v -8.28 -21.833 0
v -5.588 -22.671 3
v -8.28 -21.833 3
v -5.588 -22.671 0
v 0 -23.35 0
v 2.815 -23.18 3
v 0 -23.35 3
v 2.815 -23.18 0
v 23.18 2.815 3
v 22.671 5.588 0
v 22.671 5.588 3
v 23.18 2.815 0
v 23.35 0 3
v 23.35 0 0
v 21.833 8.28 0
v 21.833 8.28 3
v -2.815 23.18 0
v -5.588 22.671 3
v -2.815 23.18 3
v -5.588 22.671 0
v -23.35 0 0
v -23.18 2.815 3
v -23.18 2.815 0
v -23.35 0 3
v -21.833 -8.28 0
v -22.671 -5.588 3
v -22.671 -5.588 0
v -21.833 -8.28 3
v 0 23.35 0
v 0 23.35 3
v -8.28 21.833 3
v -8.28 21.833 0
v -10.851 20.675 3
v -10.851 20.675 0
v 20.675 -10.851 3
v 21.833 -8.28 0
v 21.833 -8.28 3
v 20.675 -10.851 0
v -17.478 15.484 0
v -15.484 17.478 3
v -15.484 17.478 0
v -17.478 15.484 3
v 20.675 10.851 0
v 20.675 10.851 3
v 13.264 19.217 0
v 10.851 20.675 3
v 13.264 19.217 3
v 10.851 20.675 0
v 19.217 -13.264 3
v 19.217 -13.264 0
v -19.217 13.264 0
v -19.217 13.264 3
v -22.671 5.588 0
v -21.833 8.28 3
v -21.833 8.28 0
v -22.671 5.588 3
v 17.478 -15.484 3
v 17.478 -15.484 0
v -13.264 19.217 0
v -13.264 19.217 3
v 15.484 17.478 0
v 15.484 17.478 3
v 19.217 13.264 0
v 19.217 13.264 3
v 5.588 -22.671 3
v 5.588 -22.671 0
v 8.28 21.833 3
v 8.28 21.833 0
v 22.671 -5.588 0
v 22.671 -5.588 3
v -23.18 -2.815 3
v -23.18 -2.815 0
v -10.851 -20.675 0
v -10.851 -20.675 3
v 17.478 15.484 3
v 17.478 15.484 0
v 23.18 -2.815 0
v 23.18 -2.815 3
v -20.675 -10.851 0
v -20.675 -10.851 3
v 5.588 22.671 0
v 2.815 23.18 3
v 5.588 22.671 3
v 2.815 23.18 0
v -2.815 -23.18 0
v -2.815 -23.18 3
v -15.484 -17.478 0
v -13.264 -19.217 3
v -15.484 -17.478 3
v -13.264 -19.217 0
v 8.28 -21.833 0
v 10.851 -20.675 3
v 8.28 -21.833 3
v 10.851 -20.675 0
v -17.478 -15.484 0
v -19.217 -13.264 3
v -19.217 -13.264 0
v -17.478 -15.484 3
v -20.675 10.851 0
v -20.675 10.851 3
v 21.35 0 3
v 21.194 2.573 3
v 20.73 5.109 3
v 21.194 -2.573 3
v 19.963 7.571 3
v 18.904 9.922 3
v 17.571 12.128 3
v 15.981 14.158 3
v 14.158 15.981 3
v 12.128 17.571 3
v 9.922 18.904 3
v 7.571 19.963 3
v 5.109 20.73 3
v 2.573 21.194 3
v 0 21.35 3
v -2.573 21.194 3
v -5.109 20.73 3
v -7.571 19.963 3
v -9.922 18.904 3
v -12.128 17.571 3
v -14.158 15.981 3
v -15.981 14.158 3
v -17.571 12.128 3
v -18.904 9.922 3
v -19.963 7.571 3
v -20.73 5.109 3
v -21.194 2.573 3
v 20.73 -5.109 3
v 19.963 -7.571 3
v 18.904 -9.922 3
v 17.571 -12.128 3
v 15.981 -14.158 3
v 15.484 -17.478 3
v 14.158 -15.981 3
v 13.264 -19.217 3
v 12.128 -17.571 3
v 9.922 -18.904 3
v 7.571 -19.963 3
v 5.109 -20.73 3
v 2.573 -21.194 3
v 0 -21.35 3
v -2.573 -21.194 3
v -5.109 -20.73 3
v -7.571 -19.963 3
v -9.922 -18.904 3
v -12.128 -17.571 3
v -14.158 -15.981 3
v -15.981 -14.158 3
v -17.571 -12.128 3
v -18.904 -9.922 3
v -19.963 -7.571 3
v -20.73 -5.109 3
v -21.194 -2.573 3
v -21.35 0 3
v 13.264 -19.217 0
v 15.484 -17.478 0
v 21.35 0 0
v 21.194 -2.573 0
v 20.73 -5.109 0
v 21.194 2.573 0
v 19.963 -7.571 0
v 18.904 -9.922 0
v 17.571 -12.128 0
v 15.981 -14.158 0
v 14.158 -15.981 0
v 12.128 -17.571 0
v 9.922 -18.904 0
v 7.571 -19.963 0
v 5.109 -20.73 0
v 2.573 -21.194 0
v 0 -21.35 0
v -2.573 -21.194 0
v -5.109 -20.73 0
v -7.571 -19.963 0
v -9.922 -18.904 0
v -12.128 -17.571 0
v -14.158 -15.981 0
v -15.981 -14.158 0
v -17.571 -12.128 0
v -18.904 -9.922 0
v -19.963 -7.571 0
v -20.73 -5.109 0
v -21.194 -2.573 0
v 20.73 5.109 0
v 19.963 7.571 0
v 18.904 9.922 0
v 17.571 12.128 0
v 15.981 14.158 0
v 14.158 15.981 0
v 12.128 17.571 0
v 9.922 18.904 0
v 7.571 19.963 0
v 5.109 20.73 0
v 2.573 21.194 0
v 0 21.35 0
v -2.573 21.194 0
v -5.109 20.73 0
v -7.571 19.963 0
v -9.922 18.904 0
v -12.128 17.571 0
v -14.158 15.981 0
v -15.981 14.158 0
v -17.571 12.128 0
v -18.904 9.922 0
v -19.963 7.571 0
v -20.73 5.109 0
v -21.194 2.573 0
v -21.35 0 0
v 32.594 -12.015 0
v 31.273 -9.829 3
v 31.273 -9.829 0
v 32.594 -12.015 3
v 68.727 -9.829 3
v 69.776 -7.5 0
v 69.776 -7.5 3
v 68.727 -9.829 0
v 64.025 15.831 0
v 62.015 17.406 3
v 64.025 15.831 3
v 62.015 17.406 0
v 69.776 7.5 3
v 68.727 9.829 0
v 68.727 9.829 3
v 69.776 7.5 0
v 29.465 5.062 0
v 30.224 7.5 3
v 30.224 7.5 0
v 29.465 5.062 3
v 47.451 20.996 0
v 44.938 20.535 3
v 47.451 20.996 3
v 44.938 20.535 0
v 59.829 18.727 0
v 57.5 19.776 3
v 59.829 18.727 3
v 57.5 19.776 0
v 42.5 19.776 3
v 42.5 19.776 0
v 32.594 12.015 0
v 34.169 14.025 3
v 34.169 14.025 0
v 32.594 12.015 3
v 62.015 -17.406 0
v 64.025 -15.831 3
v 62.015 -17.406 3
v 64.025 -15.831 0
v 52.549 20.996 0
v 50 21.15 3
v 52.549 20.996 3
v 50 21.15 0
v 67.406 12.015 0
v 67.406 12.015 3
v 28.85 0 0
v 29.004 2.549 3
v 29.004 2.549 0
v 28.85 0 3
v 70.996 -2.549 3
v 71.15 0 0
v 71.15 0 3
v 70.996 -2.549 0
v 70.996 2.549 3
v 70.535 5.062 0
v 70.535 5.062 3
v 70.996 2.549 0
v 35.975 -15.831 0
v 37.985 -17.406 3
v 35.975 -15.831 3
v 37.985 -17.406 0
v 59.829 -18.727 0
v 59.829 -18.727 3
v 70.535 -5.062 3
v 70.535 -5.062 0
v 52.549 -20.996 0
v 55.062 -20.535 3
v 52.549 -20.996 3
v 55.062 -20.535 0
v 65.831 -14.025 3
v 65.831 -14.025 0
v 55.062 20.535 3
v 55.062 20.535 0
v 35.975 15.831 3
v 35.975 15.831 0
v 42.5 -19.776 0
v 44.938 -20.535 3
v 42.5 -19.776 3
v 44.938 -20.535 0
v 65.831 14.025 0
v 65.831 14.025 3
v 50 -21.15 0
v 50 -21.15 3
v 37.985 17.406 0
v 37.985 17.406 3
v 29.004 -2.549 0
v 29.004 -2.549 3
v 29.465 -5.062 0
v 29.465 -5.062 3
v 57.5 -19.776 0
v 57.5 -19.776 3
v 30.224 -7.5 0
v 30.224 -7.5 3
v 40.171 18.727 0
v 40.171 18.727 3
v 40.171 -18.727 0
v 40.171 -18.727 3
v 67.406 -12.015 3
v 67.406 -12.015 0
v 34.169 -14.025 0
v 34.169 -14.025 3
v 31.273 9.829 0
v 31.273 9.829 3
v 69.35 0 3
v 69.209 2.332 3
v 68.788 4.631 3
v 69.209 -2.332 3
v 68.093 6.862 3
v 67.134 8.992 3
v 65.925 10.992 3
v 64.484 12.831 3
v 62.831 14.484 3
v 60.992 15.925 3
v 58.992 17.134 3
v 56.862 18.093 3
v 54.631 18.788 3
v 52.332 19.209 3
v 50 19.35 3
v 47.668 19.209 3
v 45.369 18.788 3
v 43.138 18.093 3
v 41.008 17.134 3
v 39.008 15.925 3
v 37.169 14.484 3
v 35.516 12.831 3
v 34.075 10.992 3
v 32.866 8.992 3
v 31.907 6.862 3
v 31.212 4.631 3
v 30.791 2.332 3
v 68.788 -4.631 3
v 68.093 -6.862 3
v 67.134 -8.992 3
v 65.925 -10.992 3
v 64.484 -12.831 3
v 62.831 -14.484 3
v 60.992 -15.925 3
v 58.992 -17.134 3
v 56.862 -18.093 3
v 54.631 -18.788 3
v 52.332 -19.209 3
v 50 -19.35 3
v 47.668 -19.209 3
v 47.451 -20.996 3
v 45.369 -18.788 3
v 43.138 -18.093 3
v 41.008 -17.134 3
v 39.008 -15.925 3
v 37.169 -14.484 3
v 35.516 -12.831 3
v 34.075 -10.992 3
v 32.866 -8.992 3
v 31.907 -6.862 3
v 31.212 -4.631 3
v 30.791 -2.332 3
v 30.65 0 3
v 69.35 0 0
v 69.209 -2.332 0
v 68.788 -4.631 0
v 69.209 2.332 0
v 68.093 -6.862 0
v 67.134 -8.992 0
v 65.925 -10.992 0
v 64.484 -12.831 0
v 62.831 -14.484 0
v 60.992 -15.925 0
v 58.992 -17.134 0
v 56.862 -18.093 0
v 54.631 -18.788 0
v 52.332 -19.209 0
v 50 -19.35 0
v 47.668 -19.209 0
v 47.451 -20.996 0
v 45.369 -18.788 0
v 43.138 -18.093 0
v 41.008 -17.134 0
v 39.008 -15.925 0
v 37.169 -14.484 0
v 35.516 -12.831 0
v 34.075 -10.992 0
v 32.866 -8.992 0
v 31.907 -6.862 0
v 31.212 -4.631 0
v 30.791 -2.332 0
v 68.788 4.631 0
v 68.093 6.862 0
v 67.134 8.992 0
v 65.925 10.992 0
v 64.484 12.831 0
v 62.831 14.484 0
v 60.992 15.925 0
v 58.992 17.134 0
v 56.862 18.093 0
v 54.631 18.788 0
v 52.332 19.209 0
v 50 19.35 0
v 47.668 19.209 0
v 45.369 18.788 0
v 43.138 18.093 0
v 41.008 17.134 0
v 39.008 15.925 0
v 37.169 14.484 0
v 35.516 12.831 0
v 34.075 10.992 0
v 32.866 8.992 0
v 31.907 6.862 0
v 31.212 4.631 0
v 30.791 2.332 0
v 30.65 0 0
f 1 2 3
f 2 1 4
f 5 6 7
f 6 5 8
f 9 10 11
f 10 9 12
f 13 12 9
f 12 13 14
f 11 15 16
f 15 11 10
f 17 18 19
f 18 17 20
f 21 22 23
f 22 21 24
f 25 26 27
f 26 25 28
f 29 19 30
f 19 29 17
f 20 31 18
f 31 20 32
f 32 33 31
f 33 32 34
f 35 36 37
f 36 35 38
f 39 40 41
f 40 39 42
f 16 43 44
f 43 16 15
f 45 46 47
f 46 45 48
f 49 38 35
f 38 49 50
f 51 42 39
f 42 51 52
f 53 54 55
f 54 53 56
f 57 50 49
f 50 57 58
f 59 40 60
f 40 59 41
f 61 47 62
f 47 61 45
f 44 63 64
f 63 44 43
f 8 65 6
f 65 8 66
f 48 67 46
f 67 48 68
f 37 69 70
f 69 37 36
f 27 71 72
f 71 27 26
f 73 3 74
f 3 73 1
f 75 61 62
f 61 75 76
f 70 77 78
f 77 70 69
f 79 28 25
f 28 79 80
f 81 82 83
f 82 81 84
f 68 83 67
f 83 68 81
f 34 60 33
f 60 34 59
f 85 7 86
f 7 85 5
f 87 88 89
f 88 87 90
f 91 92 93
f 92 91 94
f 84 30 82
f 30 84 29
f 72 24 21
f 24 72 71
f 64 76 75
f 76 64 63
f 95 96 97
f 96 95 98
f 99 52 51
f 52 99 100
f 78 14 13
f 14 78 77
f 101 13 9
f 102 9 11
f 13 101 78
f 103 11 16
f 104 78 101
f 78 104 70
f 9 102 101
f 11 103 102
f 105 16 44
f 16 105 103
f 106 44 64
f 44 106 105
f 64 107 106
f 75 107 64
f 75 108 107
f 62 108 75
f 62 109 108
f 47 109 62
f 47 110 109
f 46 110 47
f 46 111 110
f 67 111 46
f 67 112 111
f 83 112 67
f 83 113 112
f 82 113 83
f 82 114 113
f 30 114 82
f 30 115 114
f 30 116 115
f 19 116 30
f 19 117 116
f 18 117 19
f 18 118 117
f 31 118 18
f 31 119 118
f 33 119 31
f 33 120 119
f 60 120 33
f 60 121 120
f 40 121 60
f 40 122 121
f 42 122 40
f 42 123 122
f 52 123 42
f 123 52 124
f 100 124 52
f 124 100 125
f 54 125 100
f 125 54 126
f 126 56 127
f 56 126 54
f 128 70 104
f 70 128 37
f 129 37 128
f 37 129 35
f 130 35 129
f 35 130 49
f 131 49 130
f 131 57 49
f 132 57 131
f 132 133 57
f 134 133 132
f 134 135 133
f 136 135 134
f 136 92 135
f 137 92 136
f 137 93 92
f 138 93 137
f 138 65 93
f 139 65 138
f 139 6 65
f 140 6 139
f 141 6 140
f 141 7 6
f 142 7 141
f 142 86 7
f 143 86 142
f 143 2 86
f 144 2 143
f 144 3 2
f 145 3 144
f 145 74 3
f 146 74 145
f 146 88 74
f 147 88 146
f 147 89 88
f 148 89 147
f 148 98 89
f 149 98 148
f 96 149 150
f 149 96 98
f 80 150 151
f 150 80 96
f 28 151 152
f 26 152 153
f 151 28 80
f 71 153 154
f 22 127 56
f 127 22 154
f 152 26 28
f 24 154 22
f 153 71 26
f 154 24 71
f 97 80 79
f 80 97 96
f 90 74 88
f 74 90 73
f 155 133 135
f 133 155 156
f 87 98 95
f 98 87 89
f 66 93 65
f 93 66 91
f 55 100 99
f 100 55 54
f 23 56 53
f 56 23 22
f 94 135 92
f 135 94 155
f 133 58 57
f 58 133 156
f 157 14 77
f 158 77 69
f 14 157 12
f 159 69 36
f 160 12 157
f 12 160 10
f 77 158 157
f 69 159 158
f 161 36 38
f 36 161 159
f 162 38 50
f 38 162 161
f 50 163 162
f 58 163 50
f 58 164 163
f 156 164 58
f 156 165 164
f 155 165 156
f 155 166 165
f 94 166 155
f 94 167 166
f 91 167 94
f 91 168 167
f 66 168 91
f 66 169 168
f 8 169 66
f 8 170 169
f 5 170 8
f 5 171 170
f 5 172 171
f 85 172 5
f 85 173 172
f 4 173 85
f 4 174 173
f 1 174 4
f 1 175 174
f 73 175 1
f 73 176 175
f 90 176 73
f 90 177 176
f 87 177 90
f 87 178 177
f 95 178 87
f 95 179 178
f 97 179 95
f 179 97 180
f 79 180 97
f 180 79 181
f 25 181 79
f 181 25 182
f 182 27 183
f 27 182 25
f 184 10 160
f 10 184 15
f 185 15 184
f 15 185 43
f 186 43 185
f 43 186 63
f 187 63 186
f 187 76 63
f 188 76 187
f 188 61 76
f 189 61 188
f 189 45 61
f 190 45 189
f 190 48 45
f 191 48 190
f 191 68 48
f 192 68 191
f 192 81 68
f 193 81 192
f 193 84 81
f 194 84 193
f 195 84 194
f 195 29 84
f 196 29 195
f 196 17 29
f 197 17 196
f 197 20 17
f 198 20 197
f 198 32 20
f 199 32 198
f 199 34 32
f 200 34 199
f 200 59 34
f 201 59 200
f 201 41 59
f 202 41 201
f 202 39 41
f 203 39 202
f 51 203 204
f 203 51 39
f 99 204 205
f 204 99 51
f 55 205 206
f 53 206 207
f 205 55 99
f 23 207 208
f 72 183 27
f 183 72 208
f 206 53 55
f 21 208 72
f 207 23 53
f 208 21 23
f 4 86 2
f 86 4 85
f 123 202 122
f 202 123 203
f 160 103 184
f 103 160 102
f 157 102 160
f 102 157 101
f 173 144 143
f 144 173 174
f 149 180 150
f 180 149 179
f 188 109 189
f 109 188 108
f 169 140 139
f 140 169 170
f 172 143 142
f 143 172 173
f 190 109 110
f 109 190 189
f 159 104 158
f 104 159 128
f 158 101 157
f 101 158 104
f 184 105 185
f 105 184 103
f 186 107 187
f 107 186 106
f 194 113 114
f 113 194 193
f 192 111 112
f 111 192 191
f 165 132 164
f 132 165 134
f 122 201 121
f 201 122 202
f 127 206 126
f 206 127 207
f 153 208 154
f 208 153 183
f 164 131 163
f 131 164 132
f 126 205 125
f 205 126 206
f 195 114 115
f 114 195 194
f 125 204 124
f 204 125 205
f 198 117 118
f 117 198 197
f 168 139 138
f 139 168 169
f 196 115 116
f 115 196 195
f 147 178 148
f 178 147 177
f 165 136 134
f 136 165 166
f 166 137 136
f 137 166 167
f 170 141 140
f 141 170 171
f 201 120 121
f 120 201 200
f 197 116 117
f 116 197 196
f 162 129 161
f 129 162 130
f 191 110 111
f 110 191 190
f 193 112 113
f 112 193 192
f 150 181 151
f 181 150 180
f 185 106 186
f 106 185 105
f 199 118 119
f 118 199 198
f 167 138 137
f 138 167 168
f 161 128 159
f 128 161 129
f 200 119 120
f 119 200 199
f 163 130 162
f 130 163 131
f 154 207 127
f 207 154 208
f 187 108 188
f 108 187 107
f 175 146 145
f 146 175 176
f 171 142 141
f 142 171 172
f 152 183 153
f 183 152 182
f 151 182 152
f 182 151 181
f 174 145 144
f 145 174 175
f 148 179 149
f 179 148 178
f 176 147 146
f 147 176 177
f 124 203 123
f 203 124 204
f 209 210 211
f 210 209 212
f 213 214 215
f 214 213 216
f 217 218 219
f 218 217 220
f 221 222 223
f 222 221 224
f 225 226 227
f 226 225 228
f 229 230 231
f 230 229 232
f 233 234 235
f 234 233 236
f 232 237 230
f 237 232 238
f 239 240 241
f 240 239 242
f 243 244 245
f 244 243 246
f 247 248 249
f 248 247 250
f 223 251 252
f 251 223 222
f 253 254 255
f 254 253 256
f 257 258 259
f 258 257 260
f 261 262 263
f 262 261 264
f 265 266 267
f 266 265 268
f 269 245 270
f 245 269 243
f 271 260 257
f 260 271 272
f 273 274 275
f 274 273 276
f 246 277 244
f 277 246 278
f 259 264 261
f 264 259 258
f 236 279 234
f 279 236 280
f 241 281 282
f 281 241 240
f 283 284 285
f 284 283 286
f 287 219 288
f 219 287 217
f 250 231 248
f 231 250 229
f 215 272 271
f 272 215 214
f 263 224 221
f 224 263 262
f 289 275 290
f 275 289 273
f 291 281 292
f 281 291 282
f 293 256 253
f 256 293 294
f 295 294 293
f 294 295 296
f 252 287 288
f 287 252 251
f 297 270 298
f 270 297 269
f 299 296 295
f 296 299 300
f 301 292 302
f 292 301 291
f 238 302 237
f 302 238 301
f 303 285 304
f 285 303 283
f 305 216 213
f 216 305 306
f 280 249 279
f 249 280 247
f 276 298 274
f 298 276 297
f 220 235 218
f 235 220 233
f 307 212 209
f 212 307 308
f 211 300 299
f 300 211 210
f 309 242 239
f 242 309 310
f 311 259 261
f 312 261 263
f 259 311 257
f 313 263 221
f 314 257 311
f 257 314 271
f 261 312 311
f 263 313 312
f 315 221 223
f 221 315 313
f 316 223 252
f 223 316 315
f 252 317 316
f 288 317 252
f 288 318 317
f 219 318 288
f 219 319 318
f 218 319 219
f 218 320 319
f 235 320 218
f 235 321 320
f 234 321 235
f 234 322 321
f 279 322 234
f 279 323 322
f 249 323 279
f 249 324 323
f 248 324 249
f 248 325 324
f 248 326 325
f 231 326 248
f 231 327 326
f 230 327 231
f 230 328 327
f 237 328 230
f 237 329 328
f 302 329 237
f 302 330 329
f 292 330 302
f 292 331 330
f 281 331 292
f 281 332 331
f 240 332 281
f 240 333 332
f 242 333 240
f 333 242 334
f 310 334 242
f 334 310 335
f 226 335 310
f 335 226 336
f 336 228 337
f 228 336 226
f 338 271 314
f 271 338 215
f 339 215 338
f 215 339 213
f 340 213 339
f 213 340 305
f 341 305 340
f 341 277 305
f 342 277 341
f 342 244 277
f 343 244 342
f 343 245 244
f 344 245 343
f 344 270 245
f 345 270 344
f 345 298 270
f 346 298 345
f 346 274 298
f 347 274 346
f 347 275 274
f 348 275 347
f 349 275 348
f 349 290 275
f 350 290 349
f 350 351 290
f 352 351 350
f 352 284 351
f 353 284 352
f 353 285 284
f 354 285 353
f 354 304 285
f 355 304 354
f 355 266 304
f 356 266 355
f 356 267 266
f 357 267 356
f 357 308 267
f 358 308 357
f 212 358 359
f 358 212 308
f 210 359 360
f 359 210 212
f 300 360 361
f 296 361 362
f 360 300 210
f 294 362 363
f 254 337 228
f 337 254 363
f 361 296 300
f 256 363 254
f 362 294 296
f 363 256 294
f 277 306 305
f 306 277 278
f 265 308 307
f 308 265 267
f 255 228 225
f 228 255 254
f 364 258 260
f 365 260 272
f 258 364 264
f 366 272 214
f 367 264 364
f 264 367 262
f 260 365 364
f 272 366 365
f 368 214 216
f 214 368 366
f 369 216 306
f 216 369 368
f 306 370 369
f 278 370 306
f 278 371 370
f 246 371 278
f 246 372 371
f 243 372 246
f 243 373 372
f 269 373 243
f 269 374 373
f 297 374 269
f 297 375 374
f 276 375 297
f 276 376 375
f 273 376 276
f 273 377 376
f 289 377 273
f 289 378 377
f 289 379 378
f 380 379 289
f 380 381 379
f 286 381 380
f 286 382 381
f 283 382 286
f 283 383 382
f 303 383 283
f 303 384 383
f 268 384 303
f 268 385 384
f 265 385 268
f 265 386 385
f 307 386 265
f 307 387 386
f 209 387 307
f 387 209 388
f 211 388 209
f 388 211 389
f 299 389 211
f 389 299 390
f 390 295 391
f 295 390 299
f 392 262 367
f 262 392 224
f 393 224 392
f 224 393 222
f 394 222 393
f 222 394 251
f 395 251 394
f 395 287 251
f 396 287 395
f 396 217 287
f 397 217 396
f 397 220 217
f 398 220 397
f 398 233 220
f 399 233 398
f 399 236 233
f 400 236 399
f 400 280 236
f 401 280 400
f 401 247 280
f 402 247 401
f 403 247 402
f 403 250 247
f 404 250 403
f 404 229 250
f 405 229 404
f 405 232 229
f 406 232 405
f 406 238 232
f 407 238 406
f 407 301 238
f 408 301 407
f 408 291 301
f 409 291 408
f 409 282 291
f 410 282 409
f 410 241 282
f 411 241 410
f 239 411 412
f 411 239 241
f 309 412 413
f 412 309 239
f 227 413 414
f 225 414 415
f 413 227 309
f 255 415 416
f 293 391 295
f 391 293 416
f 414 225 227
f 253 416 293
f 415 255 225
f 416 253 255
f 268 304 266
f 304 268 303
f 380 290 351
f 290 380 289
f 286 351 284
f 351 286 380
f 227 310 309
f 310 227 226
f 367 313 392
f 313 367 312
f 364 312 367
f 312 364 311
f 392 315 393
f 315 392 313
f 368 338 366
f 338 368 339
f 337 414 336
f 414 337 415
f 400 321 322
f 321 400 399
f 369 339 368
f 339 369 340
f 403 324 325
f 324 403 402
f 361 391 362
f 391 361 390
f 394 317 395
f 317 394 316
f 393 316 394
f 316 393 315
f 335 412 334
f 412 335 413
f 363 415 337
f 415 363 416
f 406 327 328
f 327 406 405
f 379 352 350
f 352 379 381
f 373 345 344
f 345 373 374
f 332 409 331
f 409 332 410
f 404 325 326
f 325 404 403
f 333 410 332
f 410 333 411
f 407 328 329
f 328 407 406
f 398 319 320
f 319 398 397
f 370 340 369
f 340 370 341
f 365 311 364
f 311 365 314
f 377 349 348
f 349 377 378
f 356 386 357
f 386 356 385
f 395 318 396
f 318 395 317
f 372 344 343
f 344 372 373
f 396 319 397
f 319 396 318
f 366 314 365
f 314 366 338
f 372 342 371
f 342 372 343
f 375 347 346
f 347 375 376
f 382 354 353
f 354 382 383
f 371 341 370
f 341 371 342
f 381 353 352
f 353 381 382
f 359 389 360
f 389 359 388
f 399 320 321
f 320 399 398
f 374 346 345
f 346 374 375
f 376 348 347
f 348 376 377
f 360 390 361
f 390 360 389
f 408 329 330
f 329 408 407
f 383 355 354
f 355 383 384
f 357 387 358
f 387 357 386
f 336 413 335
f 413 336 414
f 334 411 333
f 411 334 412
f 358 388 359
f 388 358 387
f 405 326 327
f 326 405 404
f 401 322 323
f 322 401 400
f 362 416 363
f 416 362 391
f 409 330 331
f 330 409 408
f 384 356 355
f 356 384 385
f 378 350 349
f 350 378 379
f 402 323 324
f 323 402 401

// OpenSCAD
$fn = 52;

r1i = ( 42.5+0.2 ) / 2;
r1o = r1i + 2.0;

difference() {
  cylinder( r=r1o, h= 3.0 );
  cylinder( r=r1i, h= 3.0+0.1 );
}

translate([50,0,0] ) {

difference() {
  cylinder( r=r1i-0.2, h= 3.0 );
  cylinder( r=r1i-2.0, h= 3.0+0.1 );
}
}
